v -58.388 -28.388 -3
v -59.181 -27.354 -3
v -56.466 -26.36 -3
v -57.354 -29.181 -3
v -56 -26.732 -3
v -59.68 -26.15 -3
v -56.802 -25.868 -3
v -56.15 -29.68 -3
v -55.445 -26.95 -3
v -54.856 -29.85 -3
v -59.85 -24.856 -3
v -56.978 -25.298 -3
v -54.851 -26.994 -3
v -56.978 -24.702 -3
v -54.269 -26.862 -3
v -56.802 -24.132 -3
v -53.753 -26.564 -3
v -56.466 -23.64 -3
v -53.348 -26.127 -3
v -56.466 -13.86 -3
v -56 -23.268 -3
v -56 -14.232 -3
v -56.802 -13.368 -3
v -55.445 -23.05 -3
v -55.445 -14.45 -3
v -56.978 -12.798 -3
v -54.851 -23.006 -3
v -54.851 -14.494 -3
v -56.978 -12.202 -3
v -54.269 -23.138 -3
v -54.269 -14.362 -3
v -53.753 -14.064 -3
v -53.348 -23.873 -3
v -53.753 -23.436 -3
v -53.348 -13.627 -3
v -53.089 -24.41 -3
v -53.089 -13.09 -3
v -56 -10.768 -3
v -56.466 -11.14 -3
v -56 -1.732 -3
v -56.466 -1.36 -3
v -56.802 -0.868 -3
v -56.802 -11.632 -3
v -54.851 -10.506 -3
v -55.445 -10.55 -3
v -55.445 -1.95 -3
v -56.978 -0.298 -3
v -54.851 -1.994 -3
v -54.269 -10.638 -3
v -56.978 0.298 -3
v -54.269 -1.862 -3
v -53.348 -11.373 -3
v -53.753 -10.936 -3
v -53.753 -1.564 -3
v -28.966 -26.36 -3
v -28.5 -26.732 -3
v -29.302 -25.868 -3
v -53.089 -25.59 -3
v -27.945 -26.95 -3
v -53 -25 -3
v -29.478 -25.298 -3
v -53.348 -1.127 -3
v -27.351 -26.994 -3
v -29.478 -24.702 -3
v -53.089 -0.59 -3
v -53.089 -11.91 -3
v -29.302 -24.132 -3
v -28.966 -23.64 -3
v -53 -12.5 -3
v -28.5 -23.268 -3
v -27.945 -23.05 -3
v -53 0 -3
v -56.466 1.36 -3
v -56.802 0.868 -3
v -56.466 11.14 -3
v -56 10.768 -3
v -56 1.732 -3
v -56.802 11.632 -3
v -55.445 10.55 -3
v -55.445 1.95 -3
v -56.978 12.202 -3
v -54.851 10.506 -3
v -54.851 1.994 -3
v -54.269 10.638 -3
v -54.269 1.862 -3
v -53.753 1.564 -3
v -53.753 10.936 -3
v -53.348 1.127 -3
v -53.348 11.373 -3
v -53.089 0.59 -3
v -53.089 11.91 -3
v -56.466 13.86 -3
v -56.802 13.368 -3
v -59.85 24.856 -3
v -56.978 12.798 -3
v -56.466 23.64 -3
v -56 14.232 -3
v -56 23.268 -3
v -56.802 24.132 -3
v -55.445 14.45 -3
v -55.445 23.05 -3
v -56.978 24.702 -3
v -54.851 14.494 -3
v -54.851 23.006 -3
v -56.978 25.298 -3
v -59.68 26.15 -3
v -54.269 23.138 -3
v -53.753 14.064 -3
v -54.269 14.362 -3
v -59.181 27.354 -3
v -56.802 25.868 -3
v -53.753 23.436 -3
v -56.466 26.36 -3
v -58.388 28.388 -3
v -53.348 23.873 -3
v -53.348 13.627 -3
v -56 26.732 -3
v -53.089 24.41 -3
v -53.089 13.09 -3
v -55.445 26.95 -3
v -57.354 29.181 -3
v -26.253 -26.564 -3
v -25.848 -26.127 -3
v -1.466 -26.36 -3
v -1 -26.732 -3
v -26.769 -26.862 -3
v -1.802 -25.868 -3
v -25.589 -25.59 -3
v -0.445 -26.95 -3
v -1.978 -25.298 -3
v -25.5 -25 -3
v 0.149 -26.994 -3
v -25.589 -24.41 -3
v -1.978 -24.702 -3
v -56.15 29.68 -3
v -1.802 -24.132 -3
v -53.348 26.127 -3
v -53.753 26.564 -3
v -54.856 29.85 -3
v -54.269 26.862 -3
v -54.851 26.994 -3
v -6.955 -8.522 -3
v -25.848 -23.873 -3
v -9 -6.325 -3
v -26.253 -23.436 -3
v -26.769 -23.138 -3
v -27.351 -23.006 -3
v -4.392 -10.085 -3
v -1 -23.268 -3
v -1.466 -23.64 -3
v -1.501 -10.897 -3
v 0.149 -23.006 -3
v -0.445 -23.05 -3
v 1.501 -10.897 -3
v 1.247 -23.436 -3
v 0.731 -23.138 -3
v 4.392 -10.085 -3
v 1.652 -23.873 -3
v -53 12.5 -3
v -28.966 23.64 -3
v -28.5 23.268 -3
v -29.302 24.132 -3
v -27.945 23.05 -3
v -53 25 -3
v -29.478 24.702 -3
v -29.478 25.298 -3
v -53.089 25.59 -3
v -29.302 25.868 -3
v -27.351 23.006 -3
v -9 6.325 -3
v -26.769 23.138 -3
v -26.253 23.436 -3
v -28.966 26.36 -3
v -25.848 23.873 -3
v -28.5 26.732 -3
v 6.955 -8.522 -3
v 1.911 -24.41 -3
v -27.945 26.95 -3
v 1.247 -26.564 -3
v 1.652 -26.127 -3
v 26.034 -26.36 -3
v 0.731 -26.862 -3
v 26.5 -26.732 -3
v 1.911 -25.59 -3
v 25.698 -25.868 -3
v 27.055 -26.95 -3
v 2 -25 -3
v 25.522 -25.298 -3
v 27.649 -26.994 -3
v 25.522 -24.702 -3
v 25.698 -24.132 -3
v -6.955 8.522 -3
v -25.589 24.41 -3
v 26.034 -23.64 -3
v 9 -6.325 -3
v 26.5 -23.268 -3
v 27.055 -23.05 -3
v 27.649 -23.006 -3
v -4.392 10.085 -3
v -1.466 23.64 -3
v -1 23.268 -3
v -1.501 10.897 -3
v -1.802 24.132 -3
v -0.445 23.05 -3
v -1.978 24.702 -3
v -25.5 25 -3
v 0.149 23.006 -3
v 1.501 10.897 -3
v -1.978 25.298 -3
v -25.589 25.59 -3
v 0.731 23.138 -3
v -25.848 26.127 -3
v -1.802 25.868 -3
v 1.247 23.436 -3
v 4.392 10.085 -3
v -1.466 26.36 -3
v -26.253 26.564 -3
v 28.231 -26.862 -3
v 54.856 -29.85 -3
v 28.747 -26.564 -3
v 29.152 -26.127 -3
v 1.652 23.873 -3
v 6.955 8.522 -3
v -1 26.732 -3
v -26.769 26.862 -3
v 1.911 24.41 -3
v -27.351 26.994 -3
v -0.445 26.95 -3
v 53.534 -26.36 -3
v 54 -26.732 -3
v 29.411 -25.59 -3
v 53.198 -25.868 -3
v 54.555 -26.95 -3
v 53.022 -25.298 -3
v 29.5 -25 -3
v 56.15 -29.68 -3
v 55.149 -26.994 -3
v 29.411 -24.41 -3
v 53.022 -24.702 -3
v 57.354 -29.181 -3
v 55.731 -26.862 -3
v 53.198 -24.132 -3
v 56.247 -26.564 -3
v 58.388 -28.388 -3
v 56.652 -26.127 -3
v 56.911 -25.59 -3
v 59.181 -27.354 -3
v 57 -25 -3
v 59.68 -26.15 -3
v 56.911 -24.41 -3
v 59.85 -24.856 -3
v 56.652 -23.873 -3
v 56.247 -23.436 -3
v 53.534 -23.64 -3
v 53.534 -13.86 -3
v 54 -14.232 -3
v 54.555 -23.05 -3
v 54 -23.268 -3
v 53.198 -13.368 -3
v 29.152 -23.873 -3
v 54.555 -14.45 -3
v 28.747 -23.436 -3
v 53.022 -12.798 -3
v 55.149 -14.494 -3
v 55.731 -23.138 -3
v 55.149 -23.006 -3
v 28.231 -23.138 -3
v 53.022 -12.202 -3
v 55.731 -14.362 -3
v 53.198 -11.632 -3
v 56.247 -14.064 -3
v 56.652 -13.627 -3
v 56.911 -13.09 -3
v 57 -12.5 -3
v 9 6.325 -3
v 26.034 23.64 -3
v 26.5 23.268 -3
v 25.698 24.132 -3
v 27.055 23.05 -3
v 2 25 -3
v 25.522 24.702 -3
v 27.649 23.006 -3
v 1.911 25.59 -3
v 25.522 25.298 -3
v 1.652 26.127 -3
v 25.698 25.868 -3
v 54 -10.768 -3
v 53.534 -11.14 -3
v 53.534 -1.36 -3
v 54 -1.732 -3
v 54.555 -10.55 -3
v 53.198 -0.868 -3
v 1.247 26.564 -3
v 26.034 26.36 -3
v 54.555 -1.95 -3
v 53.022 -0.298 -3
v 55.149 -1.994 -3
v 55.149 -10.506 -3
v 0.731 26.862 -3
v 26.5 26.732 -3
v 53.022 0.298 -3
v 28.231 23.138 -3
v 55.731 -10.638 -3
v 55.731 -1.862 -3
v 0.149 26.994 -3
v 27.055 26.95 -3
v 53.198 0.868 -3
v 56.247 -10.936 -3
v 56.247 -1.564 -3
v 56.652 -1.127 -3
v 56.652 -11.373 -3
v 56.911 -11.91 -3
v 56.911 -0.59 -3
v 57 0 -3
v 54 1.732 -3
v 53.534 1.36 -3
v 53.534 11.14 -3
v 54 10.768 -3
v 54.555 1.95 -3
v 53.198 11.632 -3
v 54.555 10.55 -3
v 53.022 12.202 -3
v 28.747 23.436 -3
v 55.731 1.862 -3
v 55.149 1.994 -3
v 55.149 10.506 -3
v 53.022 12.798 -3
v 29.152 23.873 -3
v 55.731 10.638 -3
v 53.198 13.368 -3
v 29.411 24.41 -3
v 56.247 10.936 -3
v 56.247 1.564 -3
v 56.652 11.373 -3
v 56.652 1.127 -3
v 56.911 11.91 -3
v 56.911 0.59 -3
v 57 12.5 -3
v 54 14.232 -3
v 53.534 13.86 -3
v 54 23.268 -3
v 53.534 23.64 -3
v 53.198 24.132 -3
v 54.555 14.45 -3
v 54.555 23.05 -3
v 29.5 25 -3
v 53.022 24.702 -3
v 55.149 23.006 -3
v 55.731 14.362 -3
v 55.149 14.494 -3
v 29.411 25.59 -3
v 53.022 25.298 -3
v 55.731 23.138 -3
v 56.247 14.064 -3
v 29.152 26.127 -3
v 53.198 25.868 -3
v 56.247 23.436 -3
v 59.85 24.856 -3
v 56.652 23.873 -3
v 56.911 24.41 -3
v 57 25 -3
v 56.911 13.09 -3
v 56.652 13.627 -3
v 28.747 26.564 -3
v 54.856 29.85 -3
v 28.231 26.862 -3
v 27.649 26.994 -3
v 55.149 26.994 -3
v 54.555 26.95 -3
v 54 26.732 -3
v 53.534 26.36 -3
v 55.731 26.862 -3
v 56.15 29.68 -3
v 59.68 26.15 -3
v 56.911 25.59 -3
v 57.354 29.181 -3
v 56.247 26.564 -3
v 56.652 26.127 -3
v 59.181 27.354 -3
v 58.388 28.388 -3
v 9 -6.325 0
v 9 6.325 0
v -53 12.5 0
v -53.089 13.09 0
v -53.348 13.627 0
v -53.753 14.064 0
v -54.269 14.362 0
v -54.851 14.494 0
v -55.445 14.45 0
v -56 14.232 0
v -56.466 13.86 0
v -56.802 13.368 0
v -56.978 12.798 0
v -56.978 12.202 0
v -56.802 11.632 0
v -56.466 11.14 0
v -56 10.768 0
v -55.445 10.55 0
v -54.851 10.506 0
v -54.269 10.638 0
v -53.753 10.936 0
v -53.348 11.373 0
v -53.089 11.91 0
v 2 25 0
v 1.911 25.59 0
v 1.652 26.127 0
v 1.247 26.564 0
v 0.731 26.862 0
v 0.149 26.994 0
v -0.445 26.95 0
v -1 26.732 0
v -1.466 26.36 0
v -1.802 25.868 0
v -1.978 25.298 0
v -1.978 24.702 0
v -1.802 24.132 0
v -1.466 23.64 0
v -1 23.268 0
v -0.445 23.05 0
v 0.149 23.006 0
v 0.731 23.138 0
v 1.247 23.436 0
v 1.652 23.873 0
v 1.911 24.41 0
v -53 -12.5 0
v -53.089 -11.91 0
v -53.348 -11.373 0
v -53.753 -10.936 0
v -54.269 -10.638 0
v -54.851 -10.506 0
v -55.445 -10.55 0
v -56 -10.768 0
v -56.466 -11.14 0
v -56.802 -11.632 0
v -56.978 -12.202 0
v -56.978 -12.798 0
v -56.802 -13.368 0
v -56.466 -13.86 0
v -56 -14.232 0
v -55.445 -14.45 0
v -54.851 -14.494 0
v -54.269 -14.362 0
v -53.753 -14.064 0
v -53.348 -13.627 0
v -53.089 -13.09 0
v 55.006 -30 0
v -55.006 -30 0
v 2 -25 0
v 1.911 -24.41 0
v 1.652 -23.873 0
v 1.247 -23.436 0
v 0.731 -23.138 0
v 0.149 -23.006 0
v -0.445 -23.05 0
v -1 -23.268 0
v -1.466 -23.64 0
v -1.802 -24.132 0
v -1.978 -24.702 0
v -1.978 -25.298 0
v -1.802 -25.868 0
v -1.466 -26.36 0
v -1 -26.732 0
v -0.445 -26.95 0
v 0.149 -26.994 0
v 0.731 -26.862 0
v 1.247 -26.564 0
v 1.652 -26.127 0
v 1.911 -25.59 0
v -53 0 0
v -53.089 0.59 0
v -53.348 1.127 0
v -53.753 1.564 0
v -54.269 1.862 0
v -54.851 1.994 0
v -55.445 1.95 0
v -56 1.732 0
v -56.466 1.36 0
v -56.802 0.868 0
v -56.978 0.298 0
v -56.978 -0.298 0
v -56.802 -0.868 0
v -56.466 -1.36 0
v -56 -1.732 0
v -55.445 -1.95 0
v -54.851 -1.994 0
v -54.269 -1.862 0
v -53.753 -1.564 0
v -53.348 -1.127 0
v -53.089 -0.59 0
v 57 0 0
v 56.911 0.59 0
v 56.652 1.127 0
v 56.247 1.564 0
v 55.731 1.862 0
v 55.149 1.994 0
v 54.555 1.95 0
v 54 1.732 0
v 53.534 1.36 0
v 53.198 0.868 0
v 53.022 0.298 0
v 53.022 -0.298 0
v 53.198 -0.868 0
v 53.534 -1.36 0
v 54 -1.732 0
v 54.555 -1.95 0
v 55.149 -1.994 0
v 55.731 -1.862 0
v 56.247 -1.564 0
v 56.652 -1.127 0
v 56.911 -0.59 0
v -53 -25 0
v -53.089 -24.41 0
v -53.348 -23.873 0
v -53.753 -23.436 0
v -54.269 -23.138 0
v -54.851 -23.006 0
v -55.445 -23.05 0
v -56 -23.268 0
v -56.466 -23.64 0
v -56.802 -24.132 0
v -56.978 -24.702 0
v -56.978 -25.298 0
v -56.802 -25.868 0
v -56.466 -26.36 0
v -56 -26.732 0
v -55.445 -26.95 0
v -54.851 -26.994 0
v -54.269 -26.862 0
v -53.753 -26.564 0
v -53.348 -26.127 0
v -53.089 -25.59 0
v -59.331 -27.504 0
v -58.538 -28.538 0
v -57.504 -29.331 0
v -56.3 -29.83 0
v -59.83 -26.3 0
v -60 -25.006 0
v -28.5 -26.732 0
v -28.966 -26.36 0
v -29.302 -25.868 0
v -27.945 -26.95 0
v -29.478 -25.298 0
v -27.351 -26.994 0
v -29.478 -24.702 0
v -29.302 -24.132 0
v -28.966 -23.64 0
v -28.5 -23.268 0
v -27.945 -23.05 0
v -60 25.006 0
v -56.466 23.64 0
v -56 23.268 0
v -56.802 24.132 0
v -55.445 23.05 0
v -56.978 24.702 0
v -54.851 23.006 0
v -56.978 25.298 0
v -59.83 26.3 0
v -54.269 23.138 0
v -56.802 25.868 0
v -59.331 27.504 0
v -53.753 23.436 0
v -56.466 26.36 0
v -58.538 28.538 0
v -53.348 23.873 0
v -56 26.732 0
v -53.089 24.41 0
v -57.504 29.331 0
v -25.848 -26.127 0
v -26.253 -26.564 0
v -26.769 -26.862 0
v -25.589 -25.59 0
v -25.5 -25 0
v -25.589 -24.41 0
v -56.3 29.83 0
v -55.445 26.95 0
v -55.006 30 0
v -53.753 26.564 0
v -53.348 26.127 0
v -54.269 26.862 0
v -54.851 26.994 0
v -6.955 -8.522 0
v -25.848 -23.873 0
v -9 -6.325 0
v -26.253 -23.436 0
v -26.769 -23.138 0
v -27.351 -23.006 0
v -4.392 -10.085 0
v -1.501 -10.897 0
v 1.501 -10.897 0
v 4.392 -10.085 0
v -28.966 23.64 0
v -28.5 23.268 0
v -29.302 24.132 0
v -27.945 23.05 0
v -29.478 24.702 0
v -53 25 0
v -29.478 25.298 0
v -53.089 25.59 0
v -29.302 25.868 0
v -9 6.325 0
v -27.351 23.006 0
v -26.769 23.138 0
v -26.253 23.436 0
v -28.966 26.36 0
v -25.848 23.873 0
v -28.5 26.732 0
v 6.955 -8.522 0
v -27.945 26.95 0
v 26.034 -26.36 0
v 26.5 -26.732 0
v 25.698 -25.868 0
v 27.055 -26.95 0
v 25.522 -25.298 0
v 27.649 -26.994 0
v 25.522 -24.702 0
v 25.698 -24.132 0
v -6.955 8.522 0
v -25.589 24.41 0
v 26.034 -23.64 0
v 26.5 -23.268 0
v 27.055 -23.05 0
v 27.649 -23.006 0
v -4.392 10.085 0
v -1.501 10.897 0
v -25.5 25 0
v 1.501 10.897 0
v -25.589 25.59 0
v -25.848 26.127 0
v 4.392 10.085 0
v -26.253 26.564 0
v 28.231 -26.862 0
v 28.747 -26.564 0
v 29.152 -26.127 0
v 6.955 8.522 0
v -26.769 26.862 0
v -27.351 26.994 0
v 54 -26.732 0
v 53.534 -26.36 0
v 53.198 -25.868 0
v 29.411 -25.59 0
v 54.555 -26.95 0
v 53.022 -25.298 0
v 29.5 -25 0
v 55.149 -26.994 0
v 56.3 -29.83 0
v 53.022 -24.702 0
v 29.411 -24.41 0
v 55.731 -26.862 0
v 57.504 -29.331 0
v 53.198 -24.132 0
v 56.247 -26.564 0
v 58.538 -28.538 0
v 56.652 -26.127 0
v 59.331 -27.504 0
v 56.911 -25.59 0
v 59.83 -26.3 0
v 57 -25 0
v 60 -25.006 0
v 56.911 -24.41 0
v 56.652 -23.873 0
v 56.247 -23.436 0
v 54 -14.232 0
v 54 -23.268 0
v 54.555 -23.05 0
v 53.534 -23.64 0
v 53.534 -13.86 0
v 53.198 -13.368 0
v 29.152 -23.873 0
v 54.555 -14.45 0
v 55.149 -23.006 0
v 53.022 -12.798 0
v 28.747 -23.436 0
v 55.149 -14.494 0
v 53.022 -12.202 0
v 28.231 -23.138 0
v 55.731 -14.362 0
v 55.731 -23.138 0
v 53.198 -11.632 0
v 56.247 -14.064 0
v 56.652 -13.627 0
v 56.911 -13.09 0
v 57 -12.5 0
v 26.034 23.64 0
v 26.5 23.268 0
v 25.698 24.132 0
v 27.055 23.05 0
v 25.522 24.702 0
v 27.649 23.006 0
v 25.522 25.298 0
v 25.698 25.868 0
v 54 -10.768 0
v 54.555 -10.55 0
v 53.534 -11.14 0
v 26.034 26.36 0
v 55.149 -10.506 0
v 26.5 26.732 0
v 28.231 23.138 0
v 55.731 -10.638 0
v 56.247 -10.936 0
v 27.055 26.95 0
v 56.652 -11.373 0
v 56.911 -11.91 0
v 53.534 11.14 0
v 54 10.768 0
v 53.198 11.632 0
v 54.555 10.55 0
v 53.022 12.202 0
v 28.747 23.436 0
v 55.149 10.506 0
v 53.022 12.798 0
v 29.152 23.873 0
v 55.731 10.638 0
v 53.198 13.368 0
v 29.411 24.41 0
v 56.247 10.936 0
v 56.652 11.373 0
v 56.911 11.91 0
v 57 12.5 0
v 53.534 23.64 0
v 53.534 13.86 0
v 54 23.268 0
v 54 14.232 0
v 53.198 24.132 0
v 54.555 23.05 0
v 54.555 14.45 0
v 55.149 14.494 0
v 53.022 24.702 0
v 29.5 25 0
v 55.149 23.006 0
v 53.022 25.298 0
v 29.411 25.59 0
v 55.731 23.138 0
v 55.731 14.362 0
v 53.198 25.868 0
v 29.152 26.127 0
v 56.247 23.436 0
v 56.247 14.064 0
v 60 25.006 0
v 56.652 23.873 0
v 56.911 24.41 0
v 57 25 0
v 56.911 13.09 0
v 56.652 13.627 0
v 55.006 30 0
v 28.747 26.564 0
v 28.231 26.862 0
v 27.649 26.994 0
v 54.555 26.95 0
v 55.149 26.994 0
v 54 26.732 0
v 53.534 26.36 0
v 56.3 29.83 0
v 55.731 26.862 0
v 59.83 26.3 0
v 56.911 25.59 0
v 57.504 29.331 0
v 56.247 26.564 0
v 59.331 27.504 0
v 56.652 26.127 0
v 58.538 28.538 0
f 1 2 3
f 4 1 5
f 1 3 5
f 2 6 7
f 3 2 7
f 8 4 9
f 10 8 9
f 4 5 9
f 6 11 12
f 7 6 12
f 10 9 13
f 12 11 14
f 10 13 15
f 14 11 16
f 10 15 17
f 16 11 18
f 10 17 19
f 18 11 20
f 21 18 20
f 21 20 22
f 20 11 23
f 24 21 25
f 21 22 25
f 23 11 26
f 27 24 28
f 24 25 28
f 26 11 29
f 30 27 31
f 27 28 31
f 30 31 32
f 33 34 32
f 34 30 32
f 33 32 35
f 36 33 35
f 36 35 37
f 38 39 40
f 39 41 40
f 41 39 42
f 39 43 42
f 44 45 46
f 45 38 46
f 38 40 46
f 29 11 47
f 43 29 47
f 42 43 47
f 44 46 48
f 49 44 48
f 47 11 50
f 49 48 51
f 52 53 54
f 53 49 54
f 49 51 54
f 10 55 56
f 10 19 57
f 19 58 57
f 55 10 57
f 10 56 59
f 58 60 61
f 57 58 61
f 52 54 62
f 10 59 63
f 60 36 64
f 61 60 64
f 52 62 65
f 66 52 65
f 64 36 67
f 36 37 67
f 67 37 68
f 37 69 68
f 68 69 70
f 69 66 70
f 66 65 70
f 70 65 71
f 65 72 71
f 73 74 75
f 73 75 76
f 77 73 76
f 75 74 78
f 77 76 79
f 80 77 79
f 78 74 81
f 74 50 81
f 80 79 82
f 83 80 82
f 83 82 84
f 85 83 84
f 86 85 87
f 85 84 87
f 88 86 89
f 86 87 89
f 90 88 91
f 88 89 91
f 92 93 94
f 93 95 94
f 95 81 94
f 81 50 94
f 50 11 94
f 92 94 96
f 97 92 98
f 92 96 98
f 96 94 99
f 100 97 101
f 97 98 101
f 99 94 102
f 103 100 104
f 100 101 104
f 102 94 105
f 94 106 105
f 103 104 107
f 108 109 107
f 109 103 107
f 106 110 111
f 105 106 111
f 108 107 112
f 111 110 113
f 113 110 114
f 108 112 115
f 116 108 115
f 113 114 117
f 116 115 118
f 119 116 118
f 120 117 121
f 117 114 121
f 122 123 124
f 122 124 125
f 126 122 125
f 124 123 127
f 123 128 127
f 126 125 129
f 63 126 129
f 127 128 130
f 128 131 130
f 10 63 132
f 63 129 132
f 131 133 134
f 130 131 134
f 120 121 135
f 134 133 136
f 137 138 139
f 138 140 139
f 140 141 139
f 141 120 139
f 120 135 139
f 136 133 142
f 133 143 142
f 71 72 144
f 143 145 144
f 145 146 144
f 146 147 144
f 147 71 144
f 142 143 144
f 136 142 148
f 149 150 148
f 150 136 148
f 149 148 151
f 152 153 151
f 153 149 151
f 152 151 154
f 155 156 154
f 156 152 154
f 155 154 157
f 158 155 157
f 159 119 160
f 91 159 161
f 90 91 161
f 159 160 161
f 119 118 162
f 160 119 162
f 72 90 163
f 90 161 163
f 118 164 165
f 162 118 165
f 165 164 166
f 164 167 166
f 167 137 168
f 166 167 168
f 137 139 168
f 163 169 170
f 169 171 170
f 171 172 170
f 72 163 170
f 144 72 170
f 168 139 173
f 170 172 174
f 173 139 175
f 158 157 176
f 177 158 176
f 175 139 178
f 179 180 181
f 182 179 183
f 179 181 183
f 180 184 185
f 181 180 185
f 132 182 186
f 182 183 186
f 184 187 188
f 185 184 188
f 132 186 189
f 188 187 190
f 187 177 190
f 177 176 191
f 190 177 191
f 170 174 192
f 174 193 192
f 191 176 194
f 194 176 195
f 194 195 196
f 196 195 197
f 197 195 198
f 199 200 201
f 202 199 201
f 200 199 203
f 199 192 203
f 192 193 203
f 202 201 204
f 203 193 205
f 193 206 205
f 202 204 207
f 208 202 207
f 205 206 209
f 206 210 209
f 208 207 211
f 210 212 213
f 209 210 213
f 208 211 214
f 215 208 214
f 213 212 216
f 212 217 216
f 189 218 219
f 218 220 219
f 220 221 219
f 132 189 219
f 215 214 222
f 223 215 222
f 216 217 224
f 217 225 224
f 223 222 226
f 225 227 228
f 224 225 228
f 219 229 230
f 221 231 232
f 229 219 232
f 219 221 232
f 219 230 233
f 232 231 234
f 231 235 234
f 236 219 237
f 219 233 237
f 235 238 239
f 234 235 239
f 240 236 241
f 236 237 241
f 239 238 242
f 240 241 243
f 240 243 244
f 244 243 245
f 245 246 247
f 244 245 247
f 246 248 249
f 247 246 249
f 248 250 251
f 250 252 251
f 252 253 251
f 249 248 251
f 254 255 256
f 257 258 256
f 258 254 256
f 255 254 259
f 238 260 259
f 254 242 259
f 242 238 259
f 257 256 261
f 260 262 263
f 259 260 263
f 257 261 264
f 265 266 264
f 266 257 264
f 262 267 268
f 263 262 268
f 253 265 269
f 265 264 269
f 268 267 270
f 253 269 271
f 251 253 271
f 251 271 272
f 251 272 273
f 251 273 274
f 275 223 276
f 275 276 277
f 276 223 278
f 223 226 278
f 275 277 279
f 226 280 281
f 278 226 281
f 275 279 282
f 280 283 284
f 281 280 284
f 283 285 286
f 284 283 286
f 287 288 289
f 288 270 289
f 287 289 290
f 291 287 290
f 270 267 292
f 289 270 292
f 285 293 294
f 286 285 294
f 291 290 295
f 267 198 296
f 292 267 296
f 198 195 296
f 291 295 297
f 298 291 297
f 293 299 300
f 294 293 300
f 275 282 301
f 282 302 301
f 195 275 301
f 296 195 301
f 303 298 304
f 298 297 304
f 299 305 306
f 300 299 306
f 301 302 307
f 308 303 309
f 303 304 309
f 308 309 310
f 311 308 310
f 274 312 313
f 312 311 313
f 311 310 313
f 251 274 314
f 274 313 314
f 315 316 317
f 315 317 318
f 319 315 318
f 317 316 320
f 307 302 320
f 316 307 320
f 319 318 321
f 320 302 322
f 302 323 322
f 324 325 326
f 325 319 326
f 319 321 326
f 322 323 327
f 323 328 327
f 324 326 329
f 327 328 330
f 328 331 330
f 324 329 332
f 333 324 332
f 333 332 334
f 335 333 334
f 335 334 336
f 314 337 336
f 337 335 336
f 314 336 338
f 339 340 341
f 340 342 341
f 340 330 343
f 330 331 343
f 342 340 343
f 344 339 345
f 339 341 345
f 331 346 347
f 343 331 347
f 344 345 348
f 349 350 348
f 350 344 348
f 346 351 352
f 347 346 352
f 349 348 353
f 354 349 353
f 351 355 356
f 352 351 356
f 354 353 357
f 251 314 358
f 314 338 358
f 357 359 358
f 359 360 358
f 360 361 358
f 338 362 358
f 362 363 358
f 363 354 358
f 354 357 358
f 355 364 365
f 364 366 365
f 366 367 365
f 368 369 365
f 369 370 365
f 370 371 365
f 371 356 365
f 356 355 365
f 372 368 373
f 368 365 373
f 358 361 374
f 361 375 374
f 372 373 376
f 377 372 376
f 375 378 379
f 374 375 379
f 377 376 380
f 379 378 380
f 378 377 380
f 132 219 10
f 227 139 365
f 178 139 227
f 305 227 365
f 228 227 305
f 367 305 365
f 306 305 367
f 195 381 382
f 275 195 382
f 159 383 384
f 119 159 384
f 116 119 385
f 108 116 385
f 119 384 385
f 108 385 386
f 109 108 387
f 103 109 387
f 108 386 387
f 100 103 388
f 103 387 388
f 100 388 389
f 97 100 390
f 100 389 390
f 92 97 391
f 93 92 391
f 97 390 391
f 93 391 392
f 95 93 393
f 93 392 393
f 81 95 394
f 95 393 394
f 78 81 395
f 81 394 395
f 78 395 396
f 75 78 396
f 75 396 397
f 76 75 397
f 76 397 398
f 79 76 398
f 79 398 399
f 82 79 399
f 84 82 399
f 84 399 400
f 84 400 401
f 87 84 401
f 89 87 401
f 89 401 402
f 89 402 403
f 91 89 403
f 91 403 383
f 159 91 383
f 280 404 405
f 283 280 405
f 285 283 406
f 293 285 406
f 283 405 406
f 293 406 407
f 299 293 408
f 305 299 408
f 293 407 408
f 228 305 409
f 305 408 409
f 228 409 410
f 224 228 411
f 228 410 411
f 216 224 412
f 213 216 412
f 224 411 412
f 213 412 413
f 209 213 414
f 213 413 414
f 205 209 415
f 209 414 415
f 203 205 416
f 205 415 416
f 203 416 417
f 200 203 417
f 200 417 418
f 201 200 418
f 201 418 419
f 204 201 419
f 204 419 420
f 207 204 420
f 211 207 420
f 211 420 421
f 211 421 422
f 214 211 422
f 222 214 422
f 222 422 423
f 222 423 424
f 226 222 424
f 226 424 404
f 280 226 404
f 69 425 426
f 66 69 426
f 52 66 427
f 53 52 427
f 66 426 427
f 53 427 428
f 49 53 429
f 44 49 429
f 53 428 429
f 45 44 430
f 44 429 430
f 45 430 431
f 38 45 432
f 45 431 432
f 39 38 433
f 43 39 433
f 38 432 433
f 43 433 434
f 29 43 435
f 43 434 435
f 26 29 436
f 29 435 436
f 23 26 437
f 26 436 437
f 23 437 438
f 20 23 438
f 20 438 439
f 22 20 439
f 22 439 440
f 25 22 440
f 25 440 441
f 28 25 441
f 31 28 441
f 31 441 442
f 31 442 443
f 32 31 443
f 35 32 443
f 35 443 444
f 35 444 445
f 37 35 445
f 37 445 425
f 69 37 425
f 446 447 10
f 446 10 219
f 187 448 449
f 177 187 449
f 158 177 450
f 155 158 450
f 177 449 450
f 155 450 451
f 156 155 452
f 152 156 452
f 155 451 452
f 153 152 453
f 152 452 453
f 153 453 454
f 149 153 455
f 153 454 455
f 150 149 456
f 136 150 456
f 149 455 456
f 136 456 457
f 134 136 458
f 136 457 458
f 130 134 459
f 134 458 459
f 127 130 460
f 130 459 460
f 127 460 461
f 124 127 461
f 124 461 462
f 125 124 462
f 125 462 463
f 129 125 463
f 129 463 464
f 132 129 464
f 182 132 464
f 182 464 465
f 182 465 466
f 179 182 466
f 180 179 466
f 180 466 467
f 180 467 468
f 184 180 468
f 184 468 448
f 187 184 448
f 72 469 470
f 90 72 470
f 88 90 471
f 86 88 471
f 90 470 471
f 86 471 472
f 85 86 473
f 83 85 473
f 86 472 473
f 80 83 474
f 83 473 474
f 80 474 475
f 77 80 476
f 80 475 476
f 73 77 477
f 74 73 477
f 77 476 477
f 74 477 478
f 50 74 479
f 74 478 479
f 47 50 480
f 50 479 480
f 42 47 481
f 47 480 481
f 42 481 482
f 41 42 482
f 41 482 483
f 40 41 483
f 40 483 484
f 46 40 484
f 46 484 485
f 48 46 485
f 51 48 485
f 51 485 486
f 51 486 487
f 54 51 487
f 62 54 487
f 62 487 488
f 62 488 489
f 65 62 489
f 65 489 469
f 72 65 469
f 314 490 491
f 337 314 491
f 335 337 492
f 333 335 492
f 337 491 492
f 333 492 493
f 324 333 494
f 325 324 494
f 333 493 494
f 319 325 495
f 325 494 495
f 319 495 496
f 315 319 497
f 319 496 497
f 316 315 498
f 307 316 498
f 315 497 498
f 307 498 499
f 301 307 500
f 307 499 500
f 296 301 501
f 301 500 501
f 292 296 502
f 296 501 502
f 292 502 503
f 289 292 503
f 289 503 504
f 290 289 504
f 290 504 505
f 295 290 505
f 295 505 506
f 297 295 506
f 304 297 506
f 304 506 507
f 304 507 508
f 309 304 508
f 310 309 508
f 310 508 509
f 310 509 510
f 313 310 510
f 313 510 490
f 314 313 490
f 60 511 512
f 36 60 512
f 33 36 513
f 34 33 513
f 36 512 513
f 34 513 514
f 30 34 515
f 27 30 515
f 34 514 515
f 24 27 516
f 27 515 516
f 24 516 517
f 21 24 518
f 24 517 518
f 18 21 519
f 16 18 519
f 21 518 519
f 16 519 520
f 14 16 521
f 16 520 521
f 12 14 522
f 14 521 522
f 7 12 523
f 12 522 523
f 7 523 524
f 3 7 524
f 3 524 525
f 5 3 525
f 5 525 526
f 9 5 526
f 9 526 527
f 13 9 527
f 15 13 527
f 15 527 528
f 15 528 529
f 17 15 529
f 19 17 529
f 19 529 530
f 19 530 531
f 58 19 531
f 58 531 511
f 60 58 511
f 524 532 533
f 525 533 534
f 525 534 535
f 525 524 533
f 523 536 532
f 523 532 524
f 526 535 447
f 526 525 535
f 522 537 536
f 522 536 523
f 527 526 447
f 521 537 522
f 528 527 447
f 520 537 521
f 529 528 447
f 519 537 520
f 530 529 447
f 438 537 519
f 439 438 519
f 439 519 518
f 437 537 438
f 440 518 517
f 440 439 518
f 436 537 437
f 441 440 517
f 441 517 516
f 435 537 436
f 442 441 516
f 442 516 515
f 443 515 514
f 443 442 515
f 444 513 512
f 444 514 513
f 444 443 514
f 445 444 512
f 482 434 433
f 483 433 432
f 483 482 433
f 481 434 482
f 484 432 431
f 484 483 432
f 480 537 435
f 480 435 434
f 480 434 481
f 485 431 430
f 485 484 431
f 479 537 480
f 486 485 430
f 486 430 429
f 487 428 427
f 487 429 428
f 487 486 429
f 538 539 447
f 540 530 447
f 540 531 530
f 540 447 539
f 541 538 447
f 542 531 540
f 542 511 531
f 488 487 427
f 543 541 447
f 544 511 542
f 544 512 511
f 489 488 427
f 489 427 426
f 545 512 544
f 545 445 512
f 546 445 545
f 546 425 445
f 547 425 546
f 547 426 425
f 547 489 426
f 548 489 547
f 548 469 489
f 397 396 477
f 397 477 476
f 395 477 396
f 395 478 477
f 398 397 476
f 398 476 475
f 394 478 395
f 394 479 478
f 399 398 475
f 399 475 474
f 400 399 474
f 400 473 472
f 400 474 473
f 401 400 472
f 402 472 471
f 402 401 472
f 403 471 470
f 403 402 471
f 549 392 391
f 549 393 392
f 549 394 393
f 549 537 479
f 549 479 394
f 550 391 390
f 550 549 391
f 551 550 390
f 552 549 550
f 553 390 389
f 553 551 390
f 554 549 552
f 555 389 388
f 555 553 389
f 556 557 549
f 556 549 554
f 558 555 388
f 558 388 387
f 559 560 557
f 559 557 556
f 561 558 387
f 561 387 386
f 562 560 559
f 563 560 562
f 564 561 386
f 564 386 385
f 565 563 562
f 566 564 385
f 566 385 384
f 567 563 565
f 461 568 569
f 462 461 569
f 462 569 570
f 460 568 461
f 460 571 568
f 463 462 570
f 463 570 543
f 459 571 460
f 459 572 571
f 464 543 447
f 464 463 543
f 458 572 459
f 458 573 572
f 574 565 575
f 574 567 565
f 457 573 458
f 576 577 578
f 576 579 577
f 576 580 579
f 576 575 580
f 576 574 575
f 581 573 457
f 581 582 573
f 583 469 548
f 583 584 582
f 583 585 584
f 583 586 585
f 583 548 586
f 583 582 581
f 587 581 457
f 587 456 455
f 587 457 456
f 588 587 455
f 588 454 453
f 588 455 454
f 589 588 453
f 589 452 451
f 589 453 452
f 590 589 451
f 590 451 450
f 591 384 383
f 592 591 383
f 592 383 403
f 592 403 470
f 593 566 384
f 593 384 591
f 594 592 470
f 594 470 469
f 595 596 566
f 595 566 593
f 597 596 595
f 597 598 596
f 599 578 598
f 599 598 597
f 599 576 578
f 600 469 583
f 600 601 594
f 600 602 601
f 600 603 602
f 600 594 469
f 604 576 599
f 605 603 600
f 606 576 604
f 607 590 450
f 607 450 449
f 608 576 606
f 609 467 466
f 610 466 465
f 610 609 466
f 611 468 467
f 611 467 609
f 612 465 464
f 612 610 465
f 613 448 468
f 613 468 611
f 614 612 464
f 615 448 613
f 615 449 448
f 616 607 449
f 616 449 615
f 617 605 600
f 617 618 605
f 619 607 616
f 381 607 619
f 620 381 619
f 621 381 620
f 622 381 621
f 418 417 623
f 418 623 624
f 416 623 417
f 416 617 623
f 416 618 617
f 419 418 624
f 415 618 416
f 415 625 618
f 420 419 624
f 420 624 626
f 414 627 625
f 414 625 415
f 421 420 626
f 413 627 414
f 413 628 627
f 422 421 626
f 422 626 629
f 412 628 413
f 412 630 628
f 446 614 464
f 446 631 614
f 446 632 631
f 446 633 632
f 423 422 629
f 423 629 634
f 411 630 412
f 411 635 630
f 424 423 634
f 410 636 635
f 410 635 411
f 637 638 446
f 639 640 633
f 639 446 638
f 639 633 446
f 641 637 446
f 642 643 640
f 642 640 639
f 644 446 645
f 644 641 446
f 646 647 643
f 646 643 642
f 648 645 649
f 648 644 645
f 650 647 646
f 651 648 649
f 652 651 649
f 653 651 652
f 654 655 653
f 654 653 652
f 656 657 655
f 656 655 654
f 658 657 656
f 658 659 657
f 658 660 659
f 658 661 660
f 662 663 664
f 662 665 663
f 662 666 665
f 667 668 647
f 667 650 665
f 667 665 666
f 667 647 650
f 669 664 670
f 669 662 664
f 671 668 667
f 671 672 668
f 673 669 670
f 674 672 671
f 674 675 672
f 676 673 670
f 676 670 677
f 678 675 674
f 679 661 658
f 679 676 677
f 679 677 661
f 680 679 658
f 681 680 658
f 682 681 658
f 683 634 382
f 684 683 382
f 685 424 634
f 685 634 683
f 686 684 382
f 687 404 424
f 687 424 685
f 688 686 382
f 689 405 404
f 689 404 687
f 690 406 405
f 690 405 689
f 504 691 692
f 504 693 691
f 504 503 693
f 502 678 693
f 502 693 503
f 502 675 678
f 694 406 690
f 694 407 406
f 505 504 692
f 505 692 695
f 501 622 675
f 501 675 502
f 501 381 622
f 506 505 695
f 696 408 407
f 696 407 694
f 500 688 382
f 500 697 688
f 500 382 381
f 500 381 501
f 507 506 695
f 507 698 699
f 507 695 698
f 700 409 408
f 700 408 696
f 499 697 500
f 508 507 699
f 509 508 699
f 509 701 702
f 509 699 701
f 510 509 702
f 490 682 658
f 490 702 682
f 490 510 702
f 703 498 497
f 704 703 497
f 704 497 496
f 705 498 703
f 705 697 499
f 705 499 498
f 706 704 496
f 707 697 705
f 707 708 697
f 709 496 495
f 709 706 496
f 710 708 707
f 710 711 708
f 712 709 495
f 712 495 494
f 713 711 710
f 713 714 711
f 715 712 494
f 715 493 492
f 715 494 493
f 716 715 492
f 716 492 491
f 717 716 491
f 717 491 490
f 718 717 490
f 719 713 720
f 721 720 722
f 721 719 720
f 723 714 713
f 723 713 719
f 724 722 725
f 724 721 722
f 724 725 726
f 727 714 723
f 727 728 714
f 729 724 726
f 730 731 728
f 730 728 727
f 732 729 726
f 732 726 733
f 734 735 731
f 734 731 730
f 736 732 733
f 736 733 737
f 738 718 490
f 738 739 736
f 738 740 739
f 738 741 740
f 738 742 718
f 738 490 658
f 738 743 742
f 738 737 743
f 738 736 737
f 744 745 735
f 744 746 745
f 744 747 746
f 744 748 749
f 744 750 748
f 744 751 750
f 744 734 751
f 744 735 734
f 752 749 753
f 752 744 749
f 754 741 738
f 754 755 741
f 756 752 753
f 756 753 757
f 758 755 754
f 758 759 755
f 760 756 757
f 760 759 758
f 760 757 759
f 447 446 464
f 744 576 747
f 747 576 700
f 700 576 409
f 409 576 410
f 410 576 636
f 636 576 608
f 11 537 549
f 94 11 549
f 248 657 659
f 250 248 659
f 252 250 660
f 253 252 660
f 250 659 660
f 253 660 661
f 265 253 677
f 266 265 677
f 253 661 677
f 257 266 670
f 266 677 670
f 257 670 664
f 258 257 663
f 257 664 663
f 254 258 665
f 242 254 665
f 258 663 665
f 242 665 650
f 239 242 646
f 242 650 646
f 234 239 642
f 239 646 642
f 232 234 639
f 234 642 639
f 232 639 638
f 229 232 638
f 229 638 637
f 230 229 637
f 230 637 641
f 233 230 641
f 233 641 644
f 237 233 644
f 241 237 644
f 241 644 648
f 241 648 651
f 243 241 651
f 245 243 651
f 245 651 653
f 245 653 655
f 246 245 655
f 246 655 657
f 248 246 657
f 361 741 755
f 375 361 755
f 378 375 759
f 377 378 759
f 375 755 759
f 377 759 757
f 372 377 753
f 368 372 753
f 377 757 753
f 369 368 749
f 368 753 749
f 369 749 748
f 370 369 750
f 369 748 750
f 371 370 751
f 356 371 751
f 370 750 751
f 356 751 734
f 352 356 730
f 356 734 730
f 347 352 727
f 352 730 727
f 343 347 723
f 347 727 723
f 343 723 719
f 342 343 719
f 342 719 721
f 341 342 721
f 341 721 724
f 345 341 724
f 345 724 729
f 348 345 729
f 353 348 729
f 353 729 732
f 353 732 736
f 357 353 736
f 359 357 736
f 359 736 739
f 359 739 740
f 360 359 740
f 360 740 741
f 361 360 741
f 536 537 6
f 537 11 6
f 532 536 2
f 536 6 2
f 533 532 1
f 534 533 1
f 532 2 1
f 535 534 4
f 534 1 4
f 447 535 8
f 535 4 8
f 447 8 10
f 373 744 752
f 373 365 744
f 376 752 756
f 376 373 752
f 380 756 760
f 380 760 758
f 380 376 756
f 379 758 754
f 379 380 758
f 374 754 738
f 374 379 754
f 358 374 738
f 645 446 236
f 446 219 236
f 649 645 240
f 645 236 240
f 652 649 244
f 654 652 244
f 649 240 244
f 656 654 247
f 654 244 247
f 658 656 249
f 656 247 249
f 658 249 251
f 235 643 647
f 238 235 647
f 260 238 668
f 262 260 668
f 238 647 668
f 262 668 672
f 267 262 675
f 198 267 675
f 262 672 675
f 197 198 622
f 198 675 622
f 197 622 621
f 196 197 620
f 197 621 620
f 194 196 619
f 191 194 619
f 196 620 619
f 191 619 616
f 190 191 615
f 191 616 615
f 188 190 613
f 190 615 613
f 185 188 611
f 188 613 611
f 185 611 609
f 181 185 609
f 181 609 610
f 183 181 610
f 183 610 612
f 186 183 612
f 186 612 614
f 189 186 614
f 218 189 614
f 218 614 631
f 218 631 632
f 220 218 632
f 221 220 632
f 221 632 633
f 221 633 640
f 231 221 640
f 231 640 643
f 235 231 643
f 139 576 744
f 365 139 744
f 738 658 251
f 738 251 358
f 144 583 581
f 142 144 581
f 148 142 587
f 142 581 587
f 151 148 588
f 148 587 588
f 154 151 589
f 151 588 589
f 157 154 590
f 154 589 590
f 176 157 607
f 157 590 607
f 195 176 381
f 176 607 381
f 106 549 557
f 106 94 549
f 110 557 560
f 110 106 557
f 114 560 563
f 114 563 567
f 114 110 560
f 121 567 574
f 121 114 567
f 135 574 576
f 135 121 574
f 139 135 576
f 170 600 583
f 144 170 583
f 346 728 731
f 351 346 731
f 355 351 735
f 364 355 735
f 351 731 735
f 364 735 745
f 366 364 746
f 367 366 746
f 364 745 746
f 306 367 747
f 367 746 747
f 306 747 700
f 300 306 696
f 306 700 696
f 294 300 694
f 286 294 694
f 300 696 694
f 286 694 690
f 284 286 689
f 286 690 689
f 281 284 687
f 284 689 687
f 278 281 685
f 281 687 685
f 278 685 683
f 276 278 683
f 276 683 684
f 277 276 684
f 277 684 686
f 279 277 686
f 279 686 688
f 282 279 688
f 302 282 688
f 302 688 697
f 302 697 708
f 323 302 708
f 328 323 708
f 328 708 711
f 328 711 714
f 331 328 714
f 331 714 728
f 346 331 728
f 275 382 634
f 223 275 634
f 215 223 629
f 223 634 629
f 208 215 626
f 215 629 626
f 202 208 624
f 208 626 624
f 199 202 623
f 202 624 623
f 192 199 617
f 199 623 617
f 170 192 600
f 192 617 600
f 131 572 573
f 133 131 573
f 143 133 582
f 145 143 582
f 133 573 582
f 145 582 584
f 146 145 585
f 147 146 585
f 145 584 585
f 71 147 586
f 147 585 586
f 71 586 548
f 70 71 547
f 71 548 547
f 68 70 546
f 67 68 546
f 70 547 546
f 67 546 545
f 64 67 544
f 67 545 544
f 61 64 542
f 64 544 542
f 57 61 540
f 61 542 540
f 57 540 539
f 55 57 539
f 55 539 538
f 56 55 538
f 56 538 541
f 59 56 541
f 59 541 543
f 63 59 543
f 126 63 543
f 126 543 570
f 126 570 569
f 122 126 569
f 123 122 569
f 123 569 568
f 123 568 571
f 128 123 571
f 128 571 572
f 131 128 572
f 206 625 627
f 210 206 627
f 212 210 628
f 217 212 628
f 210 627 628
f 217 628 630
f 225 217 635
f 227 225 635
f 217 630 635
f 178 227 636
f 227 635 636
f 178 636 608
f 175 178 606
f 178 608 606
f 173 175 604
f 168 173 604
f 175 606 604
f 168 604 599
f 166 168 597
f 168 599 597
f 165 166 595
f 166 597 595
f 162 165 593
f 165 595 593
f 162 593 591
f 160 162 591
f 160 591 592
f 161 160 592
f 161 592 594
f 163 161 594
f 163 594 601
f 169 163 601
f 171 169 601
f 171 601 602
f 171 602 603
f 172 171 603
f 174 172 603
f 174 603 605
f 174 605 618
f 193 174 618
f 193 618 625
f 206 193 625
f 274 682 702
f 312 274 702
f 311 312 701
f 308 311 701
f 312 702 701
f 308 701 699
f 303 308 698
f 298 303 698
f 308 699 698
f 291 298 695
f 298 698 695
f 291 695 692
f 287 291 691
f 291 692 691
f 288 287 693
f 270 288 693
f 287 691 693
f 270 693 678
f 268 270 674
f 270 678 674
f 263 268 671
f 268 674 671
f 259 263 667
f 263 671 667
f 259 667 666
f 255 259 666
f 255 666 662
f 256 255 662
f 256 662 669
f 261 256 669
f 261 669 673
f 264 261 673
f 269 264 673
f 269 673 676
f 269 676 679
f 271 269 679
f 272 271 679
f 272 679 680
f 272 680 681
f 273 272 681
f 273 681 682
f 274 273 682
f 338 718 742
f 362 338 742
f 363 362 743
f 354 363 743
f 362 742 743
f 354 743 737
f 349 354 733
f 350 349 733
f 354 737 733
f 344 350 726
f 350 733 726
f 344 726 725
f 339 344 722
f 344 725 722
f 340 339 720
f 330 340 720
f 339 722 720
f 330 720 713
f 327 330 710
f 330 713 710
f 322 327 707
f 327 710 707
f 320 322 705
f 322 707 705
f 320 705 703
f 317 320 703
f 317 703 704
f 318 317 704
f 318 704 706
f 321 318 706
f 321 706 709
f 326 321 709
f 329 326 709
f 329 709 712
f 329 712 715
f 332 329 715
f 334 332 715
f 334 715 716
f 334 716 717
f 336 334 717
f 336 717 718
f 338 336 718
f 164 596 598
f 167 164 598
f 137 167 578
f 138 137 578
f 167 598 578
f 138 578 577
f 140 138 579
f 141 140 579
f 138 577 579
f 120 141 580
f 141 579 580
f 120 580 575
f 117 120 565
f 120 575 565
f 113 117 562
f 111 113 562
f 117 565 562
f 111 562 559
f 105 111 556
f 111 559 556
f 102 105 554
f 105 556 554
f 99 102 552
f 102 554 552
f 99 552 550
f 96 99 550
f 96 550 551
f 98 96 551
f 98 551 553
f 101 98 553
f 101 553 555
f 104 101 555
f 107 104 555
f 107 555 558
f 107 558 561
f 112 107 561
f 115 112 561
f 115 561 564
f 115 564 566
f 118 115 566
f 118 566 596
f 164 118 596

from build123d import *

# Parameters (mm, degrees)
SKETCH1_W           = 120
SKETCH1_H           = 60
BOSS_EXTRUDE1_DEPTH = 3
BOSS_EXTRUDE1_DRAFT = -2.862405226
CUT_EXTRUDE4_DEPTH  = 25
FILLET1_R           = 5
CUT_EXTRUDE5_REACH  = 69.149
SKETCH6_R           = 2


with BuildPart() as part:
    # Sketch1 → Boss-Extrude1 (with draft: the straight prism first)
    with BuildSketch(Plane.XY):
        Rectangle(SKETCH1_W, SKETCH1_H)
    extrude(amount=-BOSS_EXTRUDE1_DEPTH)
    # Boss-Extrude1: the draft: its side faces are tilted about the plane it starts from
    boss_extrude1_sides = [part.faces().sort_by_distance(p)[0] for p in [
        (0, -30, -1.5),
        (60, 0, -1.5),
        (0, 30, -1.5),
        (-60, 0, -1.5),
    ]]
    draft(boss_extrude1_sides, Plane.XY, BOSS_EXTRUDE1_DRAFT)

    # Sketch5 → Cut-Extrude4 (cut)
    with BuildSketch(Plane.XY):
        with BuildLine():
            Line((-9, 6.32455532), (-9, -6.32455532))
            ThreePointArc((-9, -6.32455532), (0, -11), (9, -6.32455532))
            Line((9, -6.32455532), (9, 6.32455532))
            ThreePointArc((9, 6.32455532), (0, 11), (-9, 6.32455532))
        make_face()
    extrude(amount=-CUT_EXTRUDE4_DEPTH, mode=Mode.SUBTRACT)

    # Fillet1
    fillet1_edges = [part.edges().sort_by_distance(p)[0] for p in [
        (59.925, -29.925, -1.5),
        (-59.925, -29.925, -1.5),
        (-59.925, 29.925, -1.5),
        (59.925, 29.925, -1.5),
    ]]
    fillet(fillet1_edges, radius=FILLET1_R)

    # Sketch6 → Cut-Extrude5 (cut, up to next)
    with BuildSketch(Plane.XY, mode=Mode.PRIVATE) as cut_extrude5_sk1:
        with Locations((-55, 25)):
            Circle(SKETCH6_R)
    cut_extrude5_tool1 = extrude(cut_extrude5_sk1.sketch, amount=-CUT_EXTRUDE5_REACH, mode=Mode.PRIVATE) & part.part
    # Sketch6 → Cut-Extrude5 (cut, up to next)
    with BuildSketch(Plane.XY, mode=Mode.PRIVATE) as cut_extrude5_sk2:
        with Locations((-27.5, 25)):
            Circle(SKETCH6_R)
    cut_extrude5_tool2 = extrude(cut_extrude5_sk2.sketch, amount=-CUT_EXTRUDE5_REACH, mode=Mode.PRIVATE) & part.part
    # Sketch6 → Cut-Extrude5 (cut, up to next)
    with BuildSketch(Plane.XY, mode=Mode.PRIVATE) as cut_extrude5_sk3:
        with Locations((0, 25)):
            Circle(SKETCH6_R)
    cut_extrude5_tool3 = extrude(cut_extrude5_sk3.sketch, amount=-CUT_EXTRUDE5_REACH, mode=Mode.PRIVATE) & part.part
    # Sketch6 → Cut-Extrude5 (cut, up to next)
    with BuildSketch(Plane.XY, mode=Mode.PRIVATE) as cut_extrude5_sk4:
        with Locations((27.5, 25)):
            Circle(SKETCH6_R)
    cut_extrude5_tool4 = extrude(cut_extrude5_sk4.sketch, amount=-CUT_EXTRUDE5_REACH, mode=Mode.PRIVATE) & part.part
    # Sketch6 → Cut-Extrude5 (cut, up to next)
    with BuildSketch(Plane.XY, mode=Mode.PRIVATE) as cut_extrude5_sk5:
        with Locations((55, 25)):
            Circle(SKETCH6_R)
    cut_extrude5_tool5 = extrude(cut_extrude5_sk5.sketch, amount=-CUT_EXTRUDE5_REACH, mode=Mode.PRIVATE) & part.part
    # Sketch6 → Cut-Extrude5 (cut, up to next)
    with BuildSketch(Plane.XY, mode=Mode.PRIVATE) as cut_extrude5_sk6:
        with Locations((55, -25)):
            Circle(SKETCH6_R)
    cut_extrude5_tool6 = extrude(cut_extrude5_sk6.sketch, amount=-CUT_EXTRUDE5_REACH, mode=Mode.PRIVATE) & part.part
    # Sketch6 → Cut-Extrude5 (cut, up to next)
    with BuildSketch(Plane.XY, mode=Mode.PRIVATE) as cut_extrude5_sk7:
        with Locations((27.5, -25)):
            Circle(SKETCH6_R)
    cut_extrude5_tool7 = extrude(cut_extrude5_sk7.sketch, amount=-CUT_EXTRUDE5_REACH, mode=Mode.PRIVATE) & part.part
    # Sketch6 → Cut-Extrude5 (cut, up to next)
    with BuildSketch(Plane.XY, mode=Mode.PRIVATE) as cut_extrude5_sk8:
        with Locations((0, -25)):
            Circle(SKETCH6_R)
    cut_extrude5_tool8 = extrude(cut_extrude5_sk8.sketch, amount=-CUT_EXTRUDE5_REACH, mode=Mode.PRIVATE) & part.part
    # Sketch6 → Cut-Extrude5 (cut, up to next)
    with BuildSketch(Plane.XY, mode=Mode.PRIVATE) as cut_extrude5_sk9:
        with Locations((-27.5, -25)):
            Circle(SKETCH6_R)
    cut_extrude5_tool9 = extrude(cut_extrude5_sk9.sketch, amount=-CUT_EXTRUDE5_REACH, mode=Mode.PRIVATE) & part.part
    # Sketch6 → Cut-Extrude5 (cut, up to next)
    with BuildSketch(Plane.XY, mode=Mode.PRIVATE) as cut_extrude5_sk10:
        with Locations((-55, -25)):
            Circle(SKETCH6_R)
    cut_extrude5_tool10 = extrude(cut_extrude5_sk10.sketch, amount=-CUT_EXTRUDE5_REACH, mode=Mode.PRIVATE) & part.part
    # Sketch6 → Cut-Extrude5 (cut, up to next)
    with BuildSketch(Plane.XY, mode=Mode.PRIVATE) as cut_extrude5_sk11:
        with Locations((-55, 12.5)):
            Circle(SKETCH6_R)
    cut_extrude5_tool11 = extrude(cut_extrude5_sk11.sketch, amount=-CUT_EXTRUDE5_REACH, mode=Mode.PRIVATE) & part.part
    # Sketch6 → Cut-Extrude5 (cut, up to next)
    with BuildSketch(Plane.XY, mode=Mode.PRIVATE) as cut_extrude5_sk12:
        with Locations((-55, 0)):
            Circle(SKETCH6_R)
    cut_extrude5_tool12 = extrude(cut_extrude5_sk12.sketch, amount=-CUT_EXTRUDE5_REACH, mode=Mode.PRIVATE) & part.part
    # Sketch6 → Cut-Extrude5 (cut, up to next)
    with BuildSketch(Plane.XY, mode=Mode.PRIVATE) as cut_extrude5_sk13:
        with Locations((-55, -12.5)):
            Circle(SKETCH6_R)
    cut_extrude5_tool13 = extrude(cut_extrude5_sk13.sketch, amount=-CUT_EXTRUDE5_REACH, mode=Mode.PRIVATE) & part.part
    # Sketch6 → Cut-Extrude5 (cut, up to next)
    with BuildSketch(Plane.XY, mode=Mode.PRIVATE) as cut_extrude5_sk14:
        with Locations((55, -12.5)):
            Circle(SKETCH6_R)
    cut_extrude5_tool14 = extrude(cut_extrude5_sk14.sketch, amount=-CUT_EXTRUDE5_REACH, mode=Mode.PRIVATE) & part.part
    # Sketch6 → Cut-Extrude5 (cut, up to next)
    with BuildSketch(Plane.XY, mode=Mode.PRIVATE) as cut_extrude5_sk15:
        with Locations((55, 0)):
            Circle(SKETCH6_R)
    cut_extrude5_tool15 = extrude(cut_extrude5_sk15.sketch, amount=-CUT_EXTRUDE5_REACH, mode=Mode.PRIVATE) & part.part
    # Sketch6 → Cut-Extrude5 (cut, up to next)
    with BuildSketch(Plane.XY, mode=Mode.PRIVATE) as cut_extrude5_sk16:
        with Locations((55, 12.5)):
            Circle(SKETCH6_R)
    cut_extrude5_tool16 = extrude(cut_extrude5_sk16.sketch, amount=-CUT_EXTRUDE5_REACH, mode=Mode.PRIVATE) & part.part
    add(cut_extrude5_tool1.solids().sort_by_distance((-55, 25, 0))[0], mode=Mode.SUBTRACT)
    add(cut_extrude5_tool2.solids().sort_by_distance((-27.5, 25, 0))[0], mode=Mode.SUBTRACT)
    add(cut_extrude5_tool3.solids().sort_by_distance((0, 25, 0))[0], mode=Mode.SUBTRACT)
    add(cut_extrude5_tool4.solids().sort_by_distance((27.5, 25, 0))[0], mode=Mode.SUBTRACT)
    add(cut_extrude5_tool5.solids().sort_by_distance((55, 25, 0))[0], mode=Mode.SUBTRACT)
    add(cut_extrude5_tool6.solids().sort_by_distance((55, -25, 0))[0], mode=Mode.SUBTRACT)
    add(cut_extrude5_tool7.solids().sort_by_distance((27.5, -25, 0))[0], mode=Mode.SUBTRACT)
    add(cut_extrude5_tool8.solids().sort_by_distance((0, -25, 0))[0], mode=Mode.SUBTRACT)
    add(cut_extrude5_tool9.solids().sort_by_distance((-27.5, -25, 0))[0], mode=Mode.SUBTRACT)
    add(cut_extrude5_tool10.solids().sort_by_distance((-55, -25, 0))[0], mode=Mode.SUBTRACT)
    add(cut_extrude5_tool11.solids().sort_by_distance((-55, 12.5, 0))[0], mode=Mode.SUBTRACT)
    add(cut_extrude5_tool12.solids().sort_by_distance((-55, 0, 0))[0], mode=Mode.SUBTRACT)
    add(cut_extrude5_tool13.solids().sort_by_distance((-55, -12.5, 0))[0], mode=Mode.SUBTRACT)
    add(cut_extrude5_tool14.solids().sort_by_distance((55, -12.5, 0))[0], mode=Mode.SUBTRACT)
    add(cut_extrude5_tool15.solids().sort_by_distance((55, 0, 0))[0], mode=Mode.SUBTRACT)
    add(cut_extrude5_tool16.solids().sort_by_distance((55, 12.5, 0))[0], mode=Mode.SUBTRACT)


solid = part.part
